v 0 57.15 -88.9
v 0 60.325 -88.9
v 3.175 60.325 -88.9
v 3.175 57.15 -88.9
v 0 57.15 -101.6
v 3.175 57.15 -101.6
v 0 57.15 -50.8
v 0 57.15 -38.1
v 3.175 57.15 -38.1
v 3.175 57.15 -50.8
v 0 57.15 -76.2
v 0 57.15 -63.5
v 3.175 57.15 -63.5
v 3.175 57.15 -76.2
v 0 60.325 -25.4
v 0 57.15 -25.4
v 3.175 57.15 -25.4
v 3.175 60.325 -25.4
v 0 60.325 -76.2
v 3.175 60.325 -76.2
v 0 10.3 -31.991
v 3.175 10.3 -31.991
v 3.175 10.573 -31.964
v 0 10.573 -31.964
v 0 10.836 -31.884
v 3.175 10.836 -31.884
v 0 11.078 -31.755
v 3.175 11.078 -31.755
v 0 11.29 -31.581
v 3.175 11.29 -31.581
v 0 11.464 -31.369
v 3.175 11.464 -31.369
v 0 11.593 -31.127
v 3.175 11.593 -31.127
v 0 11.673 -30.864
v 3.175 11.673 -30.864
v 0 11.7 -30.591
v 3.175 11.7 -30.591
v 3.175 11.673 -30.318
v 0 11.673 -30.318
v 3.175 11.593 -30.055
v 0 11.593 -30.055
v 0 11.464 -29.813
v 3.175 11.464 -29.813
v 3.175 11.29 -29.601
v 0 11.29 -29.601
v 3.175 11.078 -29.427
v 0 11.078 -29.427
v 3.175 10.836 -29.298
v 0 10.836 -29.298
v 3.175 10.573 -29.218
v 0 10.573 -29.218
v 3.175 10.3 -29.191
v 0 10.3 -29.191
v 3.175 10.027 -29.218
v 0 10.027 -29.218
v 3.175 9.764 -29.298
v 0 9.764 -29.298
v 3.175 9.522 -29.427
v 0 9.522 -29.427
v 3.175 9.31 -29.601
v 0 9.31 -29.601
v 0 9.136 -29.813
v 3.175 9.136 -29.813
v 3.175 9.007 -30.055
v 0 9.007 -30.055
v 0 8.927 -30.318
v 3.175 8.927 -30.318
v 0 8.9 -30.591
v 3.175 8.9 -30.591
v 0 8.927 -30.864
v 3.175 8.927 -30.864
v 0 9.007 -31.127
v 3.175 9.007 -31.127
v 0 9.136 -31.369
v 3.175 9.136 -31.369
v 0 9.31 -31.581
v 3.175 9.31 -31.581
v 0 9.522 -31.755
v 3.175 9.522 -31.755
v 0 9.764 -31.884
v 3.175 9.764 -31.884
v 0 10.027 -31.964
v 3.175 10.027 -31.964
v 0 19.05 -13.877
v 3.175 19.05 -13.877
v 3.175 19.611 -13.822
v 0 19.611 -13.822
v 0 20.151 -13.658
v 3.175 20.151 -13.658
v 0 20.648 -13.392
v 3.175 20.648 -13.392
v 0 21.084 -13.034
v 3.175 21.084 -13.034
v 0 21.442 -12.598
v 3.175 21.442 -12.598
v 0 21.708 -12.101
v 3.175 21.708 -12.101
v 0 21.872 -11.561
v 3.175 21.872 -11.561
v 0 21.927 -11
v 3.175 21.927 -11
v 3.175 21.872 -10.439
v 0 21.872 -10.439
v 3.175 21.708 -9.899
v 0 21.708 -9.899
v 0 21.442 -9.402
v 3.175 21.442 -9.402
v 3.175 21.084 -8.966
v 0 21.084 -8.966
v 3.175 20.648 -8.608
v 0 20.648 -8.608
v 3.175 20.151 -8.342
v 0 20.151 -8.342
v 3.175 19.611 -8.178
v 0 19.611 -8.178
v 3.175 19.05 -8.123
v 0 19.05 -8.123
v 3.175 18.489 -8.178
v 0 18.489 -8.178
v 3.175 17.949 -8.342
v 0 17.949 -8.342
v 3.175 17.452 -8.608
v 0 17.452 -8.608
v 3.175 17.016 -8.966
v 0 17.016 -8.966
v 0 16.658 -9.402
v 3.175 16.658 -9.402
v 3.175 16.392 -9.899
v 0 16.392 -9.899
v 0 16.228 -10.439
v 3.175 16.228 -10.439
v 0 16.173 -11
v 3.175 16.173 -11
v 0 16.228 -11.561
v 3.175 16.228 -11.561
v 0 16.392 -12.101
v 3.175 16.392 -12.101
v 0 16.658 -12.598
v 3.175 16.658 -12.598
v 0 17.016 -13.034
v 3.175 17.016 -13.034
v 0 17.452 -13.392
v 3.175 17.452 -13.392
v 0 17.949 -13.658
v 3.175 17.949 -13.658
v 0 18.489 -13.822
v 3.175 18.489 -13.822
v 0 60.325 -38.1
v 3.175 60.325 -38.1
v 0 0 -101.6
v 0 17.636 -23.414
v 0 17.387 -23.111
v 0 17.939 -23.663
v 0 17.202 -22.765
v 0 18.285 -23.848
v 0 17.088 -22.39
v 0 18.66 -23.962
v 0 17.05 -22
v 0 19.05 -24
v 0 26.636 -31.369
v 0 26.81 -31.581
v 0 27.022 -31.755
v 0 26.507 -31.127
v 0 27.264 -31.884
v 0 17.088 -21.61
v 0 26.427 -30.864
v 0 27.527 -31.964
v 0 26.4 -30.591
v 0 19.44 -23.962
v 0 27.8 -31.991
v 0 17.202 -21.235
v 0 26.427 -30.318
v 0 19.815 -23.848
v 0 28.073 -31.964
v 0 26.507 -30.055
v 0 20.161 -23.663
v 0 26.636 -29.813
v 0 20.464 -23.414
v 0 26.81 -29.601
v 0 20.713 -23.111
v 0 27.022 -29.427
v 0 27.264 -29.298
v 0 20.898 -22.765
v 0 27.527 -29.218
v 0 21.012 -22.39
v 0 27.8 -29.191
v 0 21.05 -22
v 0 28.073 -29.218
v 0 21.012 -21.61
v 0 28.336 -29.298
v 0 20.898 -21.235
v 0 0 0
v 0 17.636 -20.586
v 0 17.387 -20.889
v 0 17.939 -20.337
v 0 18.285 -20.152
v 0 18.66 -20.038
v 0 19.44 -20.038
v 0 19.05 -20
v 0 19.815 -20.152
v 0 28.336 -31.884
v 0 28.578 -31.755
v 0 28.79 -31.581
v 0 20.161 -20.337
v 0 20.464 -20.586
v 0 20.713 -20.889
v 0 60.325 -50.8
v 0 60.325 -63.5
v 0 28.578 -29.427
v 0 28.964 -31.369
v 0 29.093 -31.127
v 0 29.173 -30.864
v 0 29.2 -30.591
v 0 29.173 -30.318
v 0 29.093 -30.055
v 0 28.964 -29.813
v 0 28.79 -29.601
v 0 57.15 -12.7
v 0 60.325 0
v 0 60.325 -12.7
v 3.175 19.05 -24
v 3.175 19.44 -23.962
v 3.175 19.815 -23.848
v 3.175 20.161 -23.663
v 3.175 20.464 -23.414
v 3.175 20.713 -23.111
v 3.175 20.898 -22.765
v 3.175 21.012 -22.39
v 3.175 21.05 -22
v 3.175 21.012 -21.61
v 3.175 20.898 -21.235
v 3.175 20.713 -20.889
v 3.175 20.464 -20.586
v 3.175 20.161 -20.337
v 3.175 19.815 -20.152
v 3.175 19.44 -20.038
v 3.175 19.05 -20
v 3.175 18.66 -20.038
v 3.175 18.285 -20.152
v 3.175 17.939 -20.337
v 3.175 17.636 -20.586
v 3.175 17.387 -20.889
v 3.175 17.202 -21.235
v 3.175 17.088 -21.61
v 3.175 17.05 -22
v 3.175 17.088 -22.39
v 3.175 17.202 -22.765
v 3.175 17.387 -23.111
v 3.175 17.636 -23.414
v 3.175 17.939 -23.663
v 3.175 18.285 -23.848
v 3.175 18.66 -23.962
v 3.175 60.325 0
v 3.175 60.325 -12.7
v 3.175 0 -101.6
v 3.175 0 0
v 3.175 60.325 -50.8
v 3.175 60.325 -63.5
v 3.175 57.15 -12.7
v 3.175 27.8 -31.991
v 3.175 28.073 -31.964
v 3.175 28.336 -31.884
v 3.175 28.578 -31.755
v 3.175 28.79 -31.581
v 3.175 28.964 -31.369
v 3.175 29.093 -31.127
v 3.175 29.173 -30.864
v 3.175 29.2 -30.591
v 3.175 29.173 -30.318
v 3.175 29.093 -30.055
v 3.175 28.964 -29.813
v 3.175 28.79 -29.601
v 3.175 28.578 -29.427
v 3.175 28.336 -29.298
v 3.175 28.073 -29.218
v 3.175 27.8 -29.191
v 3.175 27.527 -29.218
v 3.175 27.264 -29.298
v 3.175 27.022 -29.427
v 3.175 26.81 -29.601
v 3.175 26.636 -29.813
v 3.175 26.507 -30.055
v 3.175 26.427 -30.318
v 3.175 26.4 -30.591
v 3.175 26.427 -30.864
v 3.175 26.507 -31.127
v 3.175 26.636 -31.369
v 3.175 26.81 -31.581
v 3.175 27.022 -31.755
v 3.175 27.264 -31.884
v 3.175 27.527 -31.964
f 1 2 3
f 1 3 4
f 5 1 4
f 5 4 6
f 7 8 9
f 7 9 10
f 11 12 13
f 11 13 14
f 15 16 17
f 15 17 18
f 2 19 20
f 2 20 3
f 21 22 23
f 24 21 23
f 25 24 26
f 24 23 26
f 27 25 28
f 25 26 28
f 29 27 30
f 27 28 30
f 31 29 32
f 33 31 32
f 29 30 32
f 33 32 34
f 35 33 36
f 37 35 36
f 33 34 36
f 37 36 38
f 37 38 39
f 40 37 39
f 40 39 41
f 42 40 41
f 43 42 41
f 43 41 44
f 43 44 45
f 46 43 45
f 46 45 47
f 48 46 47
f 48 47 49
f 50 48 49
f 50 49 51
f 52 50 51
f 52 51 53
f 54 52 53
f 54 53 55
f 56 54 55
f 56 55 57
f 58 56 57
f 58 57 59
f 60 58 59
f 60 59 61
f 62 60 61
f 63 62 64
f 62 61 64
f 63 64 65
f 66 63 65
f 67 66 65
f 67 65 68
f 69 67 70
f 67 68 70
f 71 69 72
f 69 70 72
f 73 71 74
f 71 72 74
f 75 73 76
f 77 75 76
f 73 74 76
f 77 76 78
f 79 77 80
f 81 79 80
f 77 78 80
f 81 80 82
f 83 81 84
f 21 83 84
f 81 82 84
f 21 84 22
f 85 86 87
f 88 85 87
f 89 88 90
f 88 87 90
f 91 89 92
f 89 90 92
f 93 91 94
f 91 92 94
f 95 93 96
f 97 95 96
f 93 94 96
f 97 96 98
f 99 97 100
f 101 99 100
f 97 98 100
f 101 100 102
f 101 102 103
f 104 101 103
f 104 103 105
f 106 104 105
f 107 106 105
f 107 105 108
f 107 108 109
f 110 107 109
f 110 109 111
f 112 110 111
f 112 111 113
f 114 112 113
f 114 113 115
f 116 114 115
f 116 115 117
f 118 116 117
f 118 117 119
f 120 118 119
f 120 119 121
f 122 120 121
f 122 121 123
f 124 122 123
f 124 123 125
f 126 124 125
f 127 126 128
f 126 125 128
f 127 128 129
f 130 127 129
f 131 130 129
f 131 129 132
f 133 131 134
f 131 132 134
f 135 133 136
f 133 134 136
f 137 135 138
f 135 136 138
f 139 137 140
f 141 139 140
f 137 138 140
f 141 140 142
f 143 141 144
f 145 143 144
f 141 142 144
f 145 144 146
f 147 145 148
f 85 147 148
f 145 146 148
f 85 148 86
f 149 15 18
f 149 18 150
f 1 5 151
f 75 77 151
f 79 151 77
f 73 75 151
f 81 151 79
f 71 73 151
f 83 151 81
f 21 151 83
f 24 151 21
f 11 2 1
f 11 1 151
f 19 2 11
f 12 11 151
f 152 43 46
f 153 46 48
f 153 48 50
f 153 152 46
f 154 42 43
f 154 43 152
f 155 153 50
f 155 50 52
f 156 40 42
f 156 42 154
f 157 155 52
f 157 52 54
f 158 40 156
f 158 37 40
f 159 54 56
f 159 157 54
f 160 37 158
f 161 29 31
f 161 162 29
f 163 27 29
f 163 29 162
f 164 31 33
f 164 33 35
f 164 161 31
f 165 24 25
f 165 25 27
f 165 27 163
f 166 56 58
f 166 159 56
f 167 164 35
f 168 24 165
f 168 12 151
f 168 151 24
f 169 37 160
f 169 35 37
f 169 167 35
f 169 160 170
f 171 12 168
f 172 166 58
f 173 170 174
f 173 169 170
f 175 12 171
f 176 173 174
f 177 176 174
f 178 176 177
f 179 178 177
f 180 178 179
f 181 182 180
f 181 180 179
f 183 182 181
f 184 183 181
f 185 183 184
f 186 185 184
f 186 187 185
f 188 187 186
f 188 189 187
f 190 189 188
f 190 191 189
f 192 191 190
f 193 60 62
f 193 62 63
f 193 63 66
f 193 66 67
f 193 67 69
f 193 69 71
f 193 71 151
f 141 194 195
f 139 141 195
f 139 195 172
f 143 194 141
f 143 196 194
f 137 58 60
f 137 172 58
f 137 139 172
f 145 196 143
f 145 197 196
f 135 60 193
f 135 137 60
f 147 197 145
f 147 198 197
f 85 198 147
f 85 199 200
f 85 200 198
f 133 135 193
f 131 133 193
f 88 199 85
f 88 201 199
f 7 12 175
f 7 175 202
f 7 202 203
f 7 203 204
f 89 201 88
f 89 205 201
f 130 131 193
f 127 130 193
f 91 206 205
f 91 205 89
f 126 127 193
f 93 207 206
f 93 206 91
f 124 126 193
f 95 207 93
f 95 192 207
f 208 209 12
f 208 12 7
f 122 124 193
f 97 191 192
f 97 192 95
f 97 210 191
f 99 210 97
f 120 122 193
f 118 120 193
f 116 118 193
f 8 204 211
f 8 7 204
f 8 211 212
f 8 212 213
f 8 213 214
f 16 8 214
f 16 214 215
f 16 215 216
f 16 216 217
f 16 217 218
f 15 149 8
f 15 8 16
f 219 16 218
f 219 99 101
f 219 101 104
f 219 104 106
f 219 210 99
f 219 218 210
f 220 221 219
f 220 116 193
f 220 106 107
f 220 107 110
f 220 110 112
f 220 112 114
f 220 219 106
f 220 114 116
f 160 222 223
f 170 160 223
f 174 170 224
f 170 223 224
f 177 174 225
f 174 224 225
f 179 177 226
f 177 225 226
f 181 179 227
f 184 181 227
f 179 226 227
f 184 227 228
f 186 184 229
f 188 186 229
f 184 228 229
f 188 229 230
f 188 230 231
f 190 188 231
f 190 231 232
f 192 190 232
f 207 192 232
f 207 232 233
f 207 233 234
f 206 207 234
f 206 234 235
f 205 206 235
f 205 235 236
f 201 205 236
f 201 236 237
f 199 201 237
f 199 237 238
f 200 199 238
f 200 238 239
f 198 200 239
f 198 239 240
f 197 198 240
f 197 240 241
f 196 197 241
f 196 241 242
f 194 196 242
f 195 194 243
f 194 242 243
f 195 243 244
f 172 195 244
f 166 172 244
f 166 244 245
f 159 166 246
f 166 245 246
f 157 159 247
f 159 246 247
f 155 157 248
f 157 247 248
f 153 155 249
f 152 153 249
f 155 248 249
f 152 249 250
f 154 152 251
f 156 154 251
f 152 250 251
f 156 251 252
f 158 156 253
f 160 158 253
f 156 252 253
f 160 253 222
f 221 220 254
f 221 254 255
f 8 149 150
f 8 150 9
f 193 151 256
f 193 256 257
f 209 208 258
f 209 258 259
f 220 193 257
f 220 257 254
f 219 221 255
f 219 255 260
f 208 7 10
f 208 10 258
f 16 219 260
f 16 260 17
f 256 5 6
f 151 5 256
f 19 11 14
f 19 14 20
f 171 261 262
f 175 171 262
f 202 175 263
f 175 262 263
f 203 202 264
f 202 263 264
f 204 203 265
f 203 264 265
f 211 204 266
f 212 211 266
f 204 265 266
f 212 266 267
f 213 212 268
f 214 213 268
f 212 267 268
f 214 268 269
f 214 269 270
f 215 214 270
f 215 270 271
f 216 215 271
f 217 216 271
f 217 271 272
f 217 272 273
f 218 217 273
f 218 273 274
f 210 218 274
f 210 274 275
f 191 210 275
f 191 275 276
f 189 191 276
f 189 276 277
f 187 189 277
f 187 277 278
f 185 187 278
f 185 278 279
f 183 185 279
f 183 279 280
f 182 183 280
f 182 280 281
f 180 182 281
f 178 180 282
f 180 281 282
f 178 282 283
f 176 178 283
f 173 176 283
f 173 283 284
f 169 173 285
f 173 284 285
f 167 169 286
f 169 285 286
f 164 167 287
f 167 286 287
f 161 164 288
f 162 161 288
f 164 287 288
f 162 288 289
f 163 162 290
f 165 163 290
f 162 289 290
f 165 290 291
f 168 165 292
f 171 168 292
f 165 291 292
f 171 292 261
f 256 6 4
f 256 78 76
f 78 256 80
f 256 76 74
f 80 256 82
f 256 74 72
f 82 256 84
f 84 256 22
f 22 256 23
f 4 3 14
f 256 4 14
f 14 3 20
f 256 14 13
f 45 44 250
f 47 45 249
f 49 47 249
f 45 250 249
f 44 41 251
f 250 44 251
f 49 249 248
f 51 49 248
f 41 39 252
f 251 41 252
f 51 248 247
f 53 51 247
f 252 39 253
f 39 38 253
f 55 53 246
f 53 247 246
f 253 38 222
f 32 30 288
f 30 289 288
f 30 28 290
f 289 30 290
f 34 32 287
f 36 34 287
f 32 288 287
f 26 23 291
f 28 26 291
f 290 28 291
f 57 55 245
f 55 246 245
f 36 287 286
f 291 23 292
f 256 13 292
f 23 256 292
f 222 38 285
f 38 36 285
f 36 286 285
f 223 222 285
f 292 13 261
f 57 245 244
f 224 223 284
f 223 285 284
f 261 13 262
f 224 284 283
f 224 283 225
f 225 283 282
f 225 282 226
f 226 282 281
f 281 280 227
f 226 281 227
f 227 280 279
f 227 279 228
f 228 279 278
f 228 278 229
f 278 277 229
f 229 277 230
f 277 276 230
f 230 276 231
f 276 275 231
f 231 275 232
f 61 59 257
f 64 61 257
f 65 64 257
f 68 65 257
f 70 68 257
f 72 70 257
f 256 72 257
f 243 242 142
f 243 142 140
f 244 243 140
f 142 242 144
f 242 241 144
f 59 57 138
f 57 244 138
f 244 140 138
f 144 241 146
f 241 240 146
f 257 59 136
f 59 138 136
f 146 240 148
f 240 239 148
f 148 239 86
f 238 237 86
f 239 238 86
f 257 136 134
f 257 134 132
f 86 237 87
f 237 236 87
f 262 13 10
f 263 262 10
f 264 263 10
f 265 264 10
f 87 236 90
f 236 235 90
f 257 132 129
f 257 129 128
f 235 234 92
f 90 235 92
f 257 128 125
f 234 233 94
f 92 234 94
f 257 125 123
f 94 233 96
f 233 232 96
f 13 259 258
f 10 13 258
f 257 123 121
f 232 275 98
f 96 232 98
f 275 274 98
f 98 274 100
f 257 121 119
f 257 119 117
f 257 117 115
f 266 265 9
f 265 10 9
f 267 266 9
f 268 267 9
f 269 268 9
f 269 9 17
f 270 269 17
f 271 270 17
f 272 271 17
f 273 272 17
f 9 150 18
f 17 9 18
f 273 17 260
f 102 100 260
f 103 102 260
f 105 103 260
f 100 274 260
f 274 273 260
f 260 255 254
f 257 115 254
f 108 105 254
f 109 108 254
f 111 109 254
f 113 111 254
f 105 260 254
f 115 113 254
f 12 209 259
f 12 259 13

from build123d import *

# Parameters (mm, degrees)
BOSS_EXTRUDE1_DEPTH = 3.175
CUT_EXTRUDE1_REACH  = 5.175
SKETCH2_R           = 1.4
SKETCH2_R_2         = 2
SKETCH2_R_3         = 2.876999961


with BuildPart() as part:
    # Sketch1 → Boss-Extrude1 (new body)
    with BuildSketch(Plane(origin=(0, 0, 0), x_dir=(0, 0, -1), z_dir=(1, 0, 0))):
        Polygon((0, 0), (0, 60.325), (12.7, 60.325), (12.7, 57.15), (25.4, 57.15), (25.4, 60.325), (38.1, 60.325), (38.1, 57.15), (50.8, 57.15), (50.8, 60.325), (63.5, 60.325), (63.5, 57.15), (76.2, 57.15), (76.2, 60.325), (88.9, 60.325), (88.9, 57.15), (101.6, 57.15), (101.6, 0), align=None)
    extrude(amount=BOSS_EXTRUDE1_DEPTH)

    # Sketch2 → Cut-Extrude1 (cut, up to next)
    with BuildSketch(Plane(origin=(3.175, 0, 0), x_dir=(0, 0, -1), z_dir=(1, 0, 0)), mode=Mode.PRIVATE) as cut_extrude1_sk1:
        with Locations((30.59102, 10.3)):
            Circle(SKETCH2_R)
    cut_extrude1_tool1 = extrude(cut_extrude1_sk1.sketch, amount=-CUT_EXTRUDE1_REACH, mode=Mode.PRIVATE) & part.part
    add(cut_extrude1_tool1.solids().sort_by_distance((3.175, 10.3, -30.59102))[0], mode=Mode.SUBTRACT)
    # Sketch2 → Cut-Extrude1 (cut, up to next)
    with BuildSketch(Plane(origin=(3.175, 0, 0), x_dir=(0, 0, -1), z_dir=(1, 0, 0)), mode=Mode.PRIVATE) as cut_extrude1_sk2:
        with Locations((30.59102, 27.8)):
            Circle(SKETCH2_R)
    cut_extrude1_tool2 = extrude(cut_extrude1_sk2.sketch, amount=-CUT_EXTRUDE1_REACH, mode=Mode.PRIVATE) & part.part
    add(cut_extrude1_tool2.solids().sort_by_distance((3.175, 27.8, -30.59102))[0], mode=Mode.SUBTRACT)
    # Sketch2 → Cut-Extrude1 (cut, up to next)
    with BuildSketch(Plane(origin=(3.175, 0, 0), x_dir=(0, 0, -1), z_dir=(1, 0, 0)), mode=Mode.PRIVATE) as cut_extrude1_sk3:
        with Locations((22.0000034, 19.05)):
            Circle(SKETCH2_R_2)
    cut_extrude1_tool3 = extrude(cut_extrude1_sk3.sketch, amount=-CUT_EXTRUDE1_REACH, mode=Mode.PRIVATE) & part.part
    add(cut_extrude1_tool3.solids().sort_by_distance((3.175, 19.05, -22.000003))[0], mode=Mode.SUBTRACT)
    # Sketch2 → Cut-Extrude1 (cut, up to next)
    with BuildSketch(Plane(origin=(3.175, 0, 0), x_dir=(0, 0, -1), z_dir=(1, 0, 0)), mode=Mode.PRIVATE) as cut_extrude1_sk4:
        with Locations((11, 19.05)):
            Circle(SKETCH2_R_3)
    cut_extrude1_tool4 = extrude(cut_extrude1_sk4.sketch, amount=-CUT_EXTRUDE1_REACH, mode=Mode.PRIVATE) & part.part
    add(cut_extrude1_tool4.solids().sort_by_distance((3.175, 19.05, -11))[0], mode=Mode.SUBTRACT)


solid = part.part
